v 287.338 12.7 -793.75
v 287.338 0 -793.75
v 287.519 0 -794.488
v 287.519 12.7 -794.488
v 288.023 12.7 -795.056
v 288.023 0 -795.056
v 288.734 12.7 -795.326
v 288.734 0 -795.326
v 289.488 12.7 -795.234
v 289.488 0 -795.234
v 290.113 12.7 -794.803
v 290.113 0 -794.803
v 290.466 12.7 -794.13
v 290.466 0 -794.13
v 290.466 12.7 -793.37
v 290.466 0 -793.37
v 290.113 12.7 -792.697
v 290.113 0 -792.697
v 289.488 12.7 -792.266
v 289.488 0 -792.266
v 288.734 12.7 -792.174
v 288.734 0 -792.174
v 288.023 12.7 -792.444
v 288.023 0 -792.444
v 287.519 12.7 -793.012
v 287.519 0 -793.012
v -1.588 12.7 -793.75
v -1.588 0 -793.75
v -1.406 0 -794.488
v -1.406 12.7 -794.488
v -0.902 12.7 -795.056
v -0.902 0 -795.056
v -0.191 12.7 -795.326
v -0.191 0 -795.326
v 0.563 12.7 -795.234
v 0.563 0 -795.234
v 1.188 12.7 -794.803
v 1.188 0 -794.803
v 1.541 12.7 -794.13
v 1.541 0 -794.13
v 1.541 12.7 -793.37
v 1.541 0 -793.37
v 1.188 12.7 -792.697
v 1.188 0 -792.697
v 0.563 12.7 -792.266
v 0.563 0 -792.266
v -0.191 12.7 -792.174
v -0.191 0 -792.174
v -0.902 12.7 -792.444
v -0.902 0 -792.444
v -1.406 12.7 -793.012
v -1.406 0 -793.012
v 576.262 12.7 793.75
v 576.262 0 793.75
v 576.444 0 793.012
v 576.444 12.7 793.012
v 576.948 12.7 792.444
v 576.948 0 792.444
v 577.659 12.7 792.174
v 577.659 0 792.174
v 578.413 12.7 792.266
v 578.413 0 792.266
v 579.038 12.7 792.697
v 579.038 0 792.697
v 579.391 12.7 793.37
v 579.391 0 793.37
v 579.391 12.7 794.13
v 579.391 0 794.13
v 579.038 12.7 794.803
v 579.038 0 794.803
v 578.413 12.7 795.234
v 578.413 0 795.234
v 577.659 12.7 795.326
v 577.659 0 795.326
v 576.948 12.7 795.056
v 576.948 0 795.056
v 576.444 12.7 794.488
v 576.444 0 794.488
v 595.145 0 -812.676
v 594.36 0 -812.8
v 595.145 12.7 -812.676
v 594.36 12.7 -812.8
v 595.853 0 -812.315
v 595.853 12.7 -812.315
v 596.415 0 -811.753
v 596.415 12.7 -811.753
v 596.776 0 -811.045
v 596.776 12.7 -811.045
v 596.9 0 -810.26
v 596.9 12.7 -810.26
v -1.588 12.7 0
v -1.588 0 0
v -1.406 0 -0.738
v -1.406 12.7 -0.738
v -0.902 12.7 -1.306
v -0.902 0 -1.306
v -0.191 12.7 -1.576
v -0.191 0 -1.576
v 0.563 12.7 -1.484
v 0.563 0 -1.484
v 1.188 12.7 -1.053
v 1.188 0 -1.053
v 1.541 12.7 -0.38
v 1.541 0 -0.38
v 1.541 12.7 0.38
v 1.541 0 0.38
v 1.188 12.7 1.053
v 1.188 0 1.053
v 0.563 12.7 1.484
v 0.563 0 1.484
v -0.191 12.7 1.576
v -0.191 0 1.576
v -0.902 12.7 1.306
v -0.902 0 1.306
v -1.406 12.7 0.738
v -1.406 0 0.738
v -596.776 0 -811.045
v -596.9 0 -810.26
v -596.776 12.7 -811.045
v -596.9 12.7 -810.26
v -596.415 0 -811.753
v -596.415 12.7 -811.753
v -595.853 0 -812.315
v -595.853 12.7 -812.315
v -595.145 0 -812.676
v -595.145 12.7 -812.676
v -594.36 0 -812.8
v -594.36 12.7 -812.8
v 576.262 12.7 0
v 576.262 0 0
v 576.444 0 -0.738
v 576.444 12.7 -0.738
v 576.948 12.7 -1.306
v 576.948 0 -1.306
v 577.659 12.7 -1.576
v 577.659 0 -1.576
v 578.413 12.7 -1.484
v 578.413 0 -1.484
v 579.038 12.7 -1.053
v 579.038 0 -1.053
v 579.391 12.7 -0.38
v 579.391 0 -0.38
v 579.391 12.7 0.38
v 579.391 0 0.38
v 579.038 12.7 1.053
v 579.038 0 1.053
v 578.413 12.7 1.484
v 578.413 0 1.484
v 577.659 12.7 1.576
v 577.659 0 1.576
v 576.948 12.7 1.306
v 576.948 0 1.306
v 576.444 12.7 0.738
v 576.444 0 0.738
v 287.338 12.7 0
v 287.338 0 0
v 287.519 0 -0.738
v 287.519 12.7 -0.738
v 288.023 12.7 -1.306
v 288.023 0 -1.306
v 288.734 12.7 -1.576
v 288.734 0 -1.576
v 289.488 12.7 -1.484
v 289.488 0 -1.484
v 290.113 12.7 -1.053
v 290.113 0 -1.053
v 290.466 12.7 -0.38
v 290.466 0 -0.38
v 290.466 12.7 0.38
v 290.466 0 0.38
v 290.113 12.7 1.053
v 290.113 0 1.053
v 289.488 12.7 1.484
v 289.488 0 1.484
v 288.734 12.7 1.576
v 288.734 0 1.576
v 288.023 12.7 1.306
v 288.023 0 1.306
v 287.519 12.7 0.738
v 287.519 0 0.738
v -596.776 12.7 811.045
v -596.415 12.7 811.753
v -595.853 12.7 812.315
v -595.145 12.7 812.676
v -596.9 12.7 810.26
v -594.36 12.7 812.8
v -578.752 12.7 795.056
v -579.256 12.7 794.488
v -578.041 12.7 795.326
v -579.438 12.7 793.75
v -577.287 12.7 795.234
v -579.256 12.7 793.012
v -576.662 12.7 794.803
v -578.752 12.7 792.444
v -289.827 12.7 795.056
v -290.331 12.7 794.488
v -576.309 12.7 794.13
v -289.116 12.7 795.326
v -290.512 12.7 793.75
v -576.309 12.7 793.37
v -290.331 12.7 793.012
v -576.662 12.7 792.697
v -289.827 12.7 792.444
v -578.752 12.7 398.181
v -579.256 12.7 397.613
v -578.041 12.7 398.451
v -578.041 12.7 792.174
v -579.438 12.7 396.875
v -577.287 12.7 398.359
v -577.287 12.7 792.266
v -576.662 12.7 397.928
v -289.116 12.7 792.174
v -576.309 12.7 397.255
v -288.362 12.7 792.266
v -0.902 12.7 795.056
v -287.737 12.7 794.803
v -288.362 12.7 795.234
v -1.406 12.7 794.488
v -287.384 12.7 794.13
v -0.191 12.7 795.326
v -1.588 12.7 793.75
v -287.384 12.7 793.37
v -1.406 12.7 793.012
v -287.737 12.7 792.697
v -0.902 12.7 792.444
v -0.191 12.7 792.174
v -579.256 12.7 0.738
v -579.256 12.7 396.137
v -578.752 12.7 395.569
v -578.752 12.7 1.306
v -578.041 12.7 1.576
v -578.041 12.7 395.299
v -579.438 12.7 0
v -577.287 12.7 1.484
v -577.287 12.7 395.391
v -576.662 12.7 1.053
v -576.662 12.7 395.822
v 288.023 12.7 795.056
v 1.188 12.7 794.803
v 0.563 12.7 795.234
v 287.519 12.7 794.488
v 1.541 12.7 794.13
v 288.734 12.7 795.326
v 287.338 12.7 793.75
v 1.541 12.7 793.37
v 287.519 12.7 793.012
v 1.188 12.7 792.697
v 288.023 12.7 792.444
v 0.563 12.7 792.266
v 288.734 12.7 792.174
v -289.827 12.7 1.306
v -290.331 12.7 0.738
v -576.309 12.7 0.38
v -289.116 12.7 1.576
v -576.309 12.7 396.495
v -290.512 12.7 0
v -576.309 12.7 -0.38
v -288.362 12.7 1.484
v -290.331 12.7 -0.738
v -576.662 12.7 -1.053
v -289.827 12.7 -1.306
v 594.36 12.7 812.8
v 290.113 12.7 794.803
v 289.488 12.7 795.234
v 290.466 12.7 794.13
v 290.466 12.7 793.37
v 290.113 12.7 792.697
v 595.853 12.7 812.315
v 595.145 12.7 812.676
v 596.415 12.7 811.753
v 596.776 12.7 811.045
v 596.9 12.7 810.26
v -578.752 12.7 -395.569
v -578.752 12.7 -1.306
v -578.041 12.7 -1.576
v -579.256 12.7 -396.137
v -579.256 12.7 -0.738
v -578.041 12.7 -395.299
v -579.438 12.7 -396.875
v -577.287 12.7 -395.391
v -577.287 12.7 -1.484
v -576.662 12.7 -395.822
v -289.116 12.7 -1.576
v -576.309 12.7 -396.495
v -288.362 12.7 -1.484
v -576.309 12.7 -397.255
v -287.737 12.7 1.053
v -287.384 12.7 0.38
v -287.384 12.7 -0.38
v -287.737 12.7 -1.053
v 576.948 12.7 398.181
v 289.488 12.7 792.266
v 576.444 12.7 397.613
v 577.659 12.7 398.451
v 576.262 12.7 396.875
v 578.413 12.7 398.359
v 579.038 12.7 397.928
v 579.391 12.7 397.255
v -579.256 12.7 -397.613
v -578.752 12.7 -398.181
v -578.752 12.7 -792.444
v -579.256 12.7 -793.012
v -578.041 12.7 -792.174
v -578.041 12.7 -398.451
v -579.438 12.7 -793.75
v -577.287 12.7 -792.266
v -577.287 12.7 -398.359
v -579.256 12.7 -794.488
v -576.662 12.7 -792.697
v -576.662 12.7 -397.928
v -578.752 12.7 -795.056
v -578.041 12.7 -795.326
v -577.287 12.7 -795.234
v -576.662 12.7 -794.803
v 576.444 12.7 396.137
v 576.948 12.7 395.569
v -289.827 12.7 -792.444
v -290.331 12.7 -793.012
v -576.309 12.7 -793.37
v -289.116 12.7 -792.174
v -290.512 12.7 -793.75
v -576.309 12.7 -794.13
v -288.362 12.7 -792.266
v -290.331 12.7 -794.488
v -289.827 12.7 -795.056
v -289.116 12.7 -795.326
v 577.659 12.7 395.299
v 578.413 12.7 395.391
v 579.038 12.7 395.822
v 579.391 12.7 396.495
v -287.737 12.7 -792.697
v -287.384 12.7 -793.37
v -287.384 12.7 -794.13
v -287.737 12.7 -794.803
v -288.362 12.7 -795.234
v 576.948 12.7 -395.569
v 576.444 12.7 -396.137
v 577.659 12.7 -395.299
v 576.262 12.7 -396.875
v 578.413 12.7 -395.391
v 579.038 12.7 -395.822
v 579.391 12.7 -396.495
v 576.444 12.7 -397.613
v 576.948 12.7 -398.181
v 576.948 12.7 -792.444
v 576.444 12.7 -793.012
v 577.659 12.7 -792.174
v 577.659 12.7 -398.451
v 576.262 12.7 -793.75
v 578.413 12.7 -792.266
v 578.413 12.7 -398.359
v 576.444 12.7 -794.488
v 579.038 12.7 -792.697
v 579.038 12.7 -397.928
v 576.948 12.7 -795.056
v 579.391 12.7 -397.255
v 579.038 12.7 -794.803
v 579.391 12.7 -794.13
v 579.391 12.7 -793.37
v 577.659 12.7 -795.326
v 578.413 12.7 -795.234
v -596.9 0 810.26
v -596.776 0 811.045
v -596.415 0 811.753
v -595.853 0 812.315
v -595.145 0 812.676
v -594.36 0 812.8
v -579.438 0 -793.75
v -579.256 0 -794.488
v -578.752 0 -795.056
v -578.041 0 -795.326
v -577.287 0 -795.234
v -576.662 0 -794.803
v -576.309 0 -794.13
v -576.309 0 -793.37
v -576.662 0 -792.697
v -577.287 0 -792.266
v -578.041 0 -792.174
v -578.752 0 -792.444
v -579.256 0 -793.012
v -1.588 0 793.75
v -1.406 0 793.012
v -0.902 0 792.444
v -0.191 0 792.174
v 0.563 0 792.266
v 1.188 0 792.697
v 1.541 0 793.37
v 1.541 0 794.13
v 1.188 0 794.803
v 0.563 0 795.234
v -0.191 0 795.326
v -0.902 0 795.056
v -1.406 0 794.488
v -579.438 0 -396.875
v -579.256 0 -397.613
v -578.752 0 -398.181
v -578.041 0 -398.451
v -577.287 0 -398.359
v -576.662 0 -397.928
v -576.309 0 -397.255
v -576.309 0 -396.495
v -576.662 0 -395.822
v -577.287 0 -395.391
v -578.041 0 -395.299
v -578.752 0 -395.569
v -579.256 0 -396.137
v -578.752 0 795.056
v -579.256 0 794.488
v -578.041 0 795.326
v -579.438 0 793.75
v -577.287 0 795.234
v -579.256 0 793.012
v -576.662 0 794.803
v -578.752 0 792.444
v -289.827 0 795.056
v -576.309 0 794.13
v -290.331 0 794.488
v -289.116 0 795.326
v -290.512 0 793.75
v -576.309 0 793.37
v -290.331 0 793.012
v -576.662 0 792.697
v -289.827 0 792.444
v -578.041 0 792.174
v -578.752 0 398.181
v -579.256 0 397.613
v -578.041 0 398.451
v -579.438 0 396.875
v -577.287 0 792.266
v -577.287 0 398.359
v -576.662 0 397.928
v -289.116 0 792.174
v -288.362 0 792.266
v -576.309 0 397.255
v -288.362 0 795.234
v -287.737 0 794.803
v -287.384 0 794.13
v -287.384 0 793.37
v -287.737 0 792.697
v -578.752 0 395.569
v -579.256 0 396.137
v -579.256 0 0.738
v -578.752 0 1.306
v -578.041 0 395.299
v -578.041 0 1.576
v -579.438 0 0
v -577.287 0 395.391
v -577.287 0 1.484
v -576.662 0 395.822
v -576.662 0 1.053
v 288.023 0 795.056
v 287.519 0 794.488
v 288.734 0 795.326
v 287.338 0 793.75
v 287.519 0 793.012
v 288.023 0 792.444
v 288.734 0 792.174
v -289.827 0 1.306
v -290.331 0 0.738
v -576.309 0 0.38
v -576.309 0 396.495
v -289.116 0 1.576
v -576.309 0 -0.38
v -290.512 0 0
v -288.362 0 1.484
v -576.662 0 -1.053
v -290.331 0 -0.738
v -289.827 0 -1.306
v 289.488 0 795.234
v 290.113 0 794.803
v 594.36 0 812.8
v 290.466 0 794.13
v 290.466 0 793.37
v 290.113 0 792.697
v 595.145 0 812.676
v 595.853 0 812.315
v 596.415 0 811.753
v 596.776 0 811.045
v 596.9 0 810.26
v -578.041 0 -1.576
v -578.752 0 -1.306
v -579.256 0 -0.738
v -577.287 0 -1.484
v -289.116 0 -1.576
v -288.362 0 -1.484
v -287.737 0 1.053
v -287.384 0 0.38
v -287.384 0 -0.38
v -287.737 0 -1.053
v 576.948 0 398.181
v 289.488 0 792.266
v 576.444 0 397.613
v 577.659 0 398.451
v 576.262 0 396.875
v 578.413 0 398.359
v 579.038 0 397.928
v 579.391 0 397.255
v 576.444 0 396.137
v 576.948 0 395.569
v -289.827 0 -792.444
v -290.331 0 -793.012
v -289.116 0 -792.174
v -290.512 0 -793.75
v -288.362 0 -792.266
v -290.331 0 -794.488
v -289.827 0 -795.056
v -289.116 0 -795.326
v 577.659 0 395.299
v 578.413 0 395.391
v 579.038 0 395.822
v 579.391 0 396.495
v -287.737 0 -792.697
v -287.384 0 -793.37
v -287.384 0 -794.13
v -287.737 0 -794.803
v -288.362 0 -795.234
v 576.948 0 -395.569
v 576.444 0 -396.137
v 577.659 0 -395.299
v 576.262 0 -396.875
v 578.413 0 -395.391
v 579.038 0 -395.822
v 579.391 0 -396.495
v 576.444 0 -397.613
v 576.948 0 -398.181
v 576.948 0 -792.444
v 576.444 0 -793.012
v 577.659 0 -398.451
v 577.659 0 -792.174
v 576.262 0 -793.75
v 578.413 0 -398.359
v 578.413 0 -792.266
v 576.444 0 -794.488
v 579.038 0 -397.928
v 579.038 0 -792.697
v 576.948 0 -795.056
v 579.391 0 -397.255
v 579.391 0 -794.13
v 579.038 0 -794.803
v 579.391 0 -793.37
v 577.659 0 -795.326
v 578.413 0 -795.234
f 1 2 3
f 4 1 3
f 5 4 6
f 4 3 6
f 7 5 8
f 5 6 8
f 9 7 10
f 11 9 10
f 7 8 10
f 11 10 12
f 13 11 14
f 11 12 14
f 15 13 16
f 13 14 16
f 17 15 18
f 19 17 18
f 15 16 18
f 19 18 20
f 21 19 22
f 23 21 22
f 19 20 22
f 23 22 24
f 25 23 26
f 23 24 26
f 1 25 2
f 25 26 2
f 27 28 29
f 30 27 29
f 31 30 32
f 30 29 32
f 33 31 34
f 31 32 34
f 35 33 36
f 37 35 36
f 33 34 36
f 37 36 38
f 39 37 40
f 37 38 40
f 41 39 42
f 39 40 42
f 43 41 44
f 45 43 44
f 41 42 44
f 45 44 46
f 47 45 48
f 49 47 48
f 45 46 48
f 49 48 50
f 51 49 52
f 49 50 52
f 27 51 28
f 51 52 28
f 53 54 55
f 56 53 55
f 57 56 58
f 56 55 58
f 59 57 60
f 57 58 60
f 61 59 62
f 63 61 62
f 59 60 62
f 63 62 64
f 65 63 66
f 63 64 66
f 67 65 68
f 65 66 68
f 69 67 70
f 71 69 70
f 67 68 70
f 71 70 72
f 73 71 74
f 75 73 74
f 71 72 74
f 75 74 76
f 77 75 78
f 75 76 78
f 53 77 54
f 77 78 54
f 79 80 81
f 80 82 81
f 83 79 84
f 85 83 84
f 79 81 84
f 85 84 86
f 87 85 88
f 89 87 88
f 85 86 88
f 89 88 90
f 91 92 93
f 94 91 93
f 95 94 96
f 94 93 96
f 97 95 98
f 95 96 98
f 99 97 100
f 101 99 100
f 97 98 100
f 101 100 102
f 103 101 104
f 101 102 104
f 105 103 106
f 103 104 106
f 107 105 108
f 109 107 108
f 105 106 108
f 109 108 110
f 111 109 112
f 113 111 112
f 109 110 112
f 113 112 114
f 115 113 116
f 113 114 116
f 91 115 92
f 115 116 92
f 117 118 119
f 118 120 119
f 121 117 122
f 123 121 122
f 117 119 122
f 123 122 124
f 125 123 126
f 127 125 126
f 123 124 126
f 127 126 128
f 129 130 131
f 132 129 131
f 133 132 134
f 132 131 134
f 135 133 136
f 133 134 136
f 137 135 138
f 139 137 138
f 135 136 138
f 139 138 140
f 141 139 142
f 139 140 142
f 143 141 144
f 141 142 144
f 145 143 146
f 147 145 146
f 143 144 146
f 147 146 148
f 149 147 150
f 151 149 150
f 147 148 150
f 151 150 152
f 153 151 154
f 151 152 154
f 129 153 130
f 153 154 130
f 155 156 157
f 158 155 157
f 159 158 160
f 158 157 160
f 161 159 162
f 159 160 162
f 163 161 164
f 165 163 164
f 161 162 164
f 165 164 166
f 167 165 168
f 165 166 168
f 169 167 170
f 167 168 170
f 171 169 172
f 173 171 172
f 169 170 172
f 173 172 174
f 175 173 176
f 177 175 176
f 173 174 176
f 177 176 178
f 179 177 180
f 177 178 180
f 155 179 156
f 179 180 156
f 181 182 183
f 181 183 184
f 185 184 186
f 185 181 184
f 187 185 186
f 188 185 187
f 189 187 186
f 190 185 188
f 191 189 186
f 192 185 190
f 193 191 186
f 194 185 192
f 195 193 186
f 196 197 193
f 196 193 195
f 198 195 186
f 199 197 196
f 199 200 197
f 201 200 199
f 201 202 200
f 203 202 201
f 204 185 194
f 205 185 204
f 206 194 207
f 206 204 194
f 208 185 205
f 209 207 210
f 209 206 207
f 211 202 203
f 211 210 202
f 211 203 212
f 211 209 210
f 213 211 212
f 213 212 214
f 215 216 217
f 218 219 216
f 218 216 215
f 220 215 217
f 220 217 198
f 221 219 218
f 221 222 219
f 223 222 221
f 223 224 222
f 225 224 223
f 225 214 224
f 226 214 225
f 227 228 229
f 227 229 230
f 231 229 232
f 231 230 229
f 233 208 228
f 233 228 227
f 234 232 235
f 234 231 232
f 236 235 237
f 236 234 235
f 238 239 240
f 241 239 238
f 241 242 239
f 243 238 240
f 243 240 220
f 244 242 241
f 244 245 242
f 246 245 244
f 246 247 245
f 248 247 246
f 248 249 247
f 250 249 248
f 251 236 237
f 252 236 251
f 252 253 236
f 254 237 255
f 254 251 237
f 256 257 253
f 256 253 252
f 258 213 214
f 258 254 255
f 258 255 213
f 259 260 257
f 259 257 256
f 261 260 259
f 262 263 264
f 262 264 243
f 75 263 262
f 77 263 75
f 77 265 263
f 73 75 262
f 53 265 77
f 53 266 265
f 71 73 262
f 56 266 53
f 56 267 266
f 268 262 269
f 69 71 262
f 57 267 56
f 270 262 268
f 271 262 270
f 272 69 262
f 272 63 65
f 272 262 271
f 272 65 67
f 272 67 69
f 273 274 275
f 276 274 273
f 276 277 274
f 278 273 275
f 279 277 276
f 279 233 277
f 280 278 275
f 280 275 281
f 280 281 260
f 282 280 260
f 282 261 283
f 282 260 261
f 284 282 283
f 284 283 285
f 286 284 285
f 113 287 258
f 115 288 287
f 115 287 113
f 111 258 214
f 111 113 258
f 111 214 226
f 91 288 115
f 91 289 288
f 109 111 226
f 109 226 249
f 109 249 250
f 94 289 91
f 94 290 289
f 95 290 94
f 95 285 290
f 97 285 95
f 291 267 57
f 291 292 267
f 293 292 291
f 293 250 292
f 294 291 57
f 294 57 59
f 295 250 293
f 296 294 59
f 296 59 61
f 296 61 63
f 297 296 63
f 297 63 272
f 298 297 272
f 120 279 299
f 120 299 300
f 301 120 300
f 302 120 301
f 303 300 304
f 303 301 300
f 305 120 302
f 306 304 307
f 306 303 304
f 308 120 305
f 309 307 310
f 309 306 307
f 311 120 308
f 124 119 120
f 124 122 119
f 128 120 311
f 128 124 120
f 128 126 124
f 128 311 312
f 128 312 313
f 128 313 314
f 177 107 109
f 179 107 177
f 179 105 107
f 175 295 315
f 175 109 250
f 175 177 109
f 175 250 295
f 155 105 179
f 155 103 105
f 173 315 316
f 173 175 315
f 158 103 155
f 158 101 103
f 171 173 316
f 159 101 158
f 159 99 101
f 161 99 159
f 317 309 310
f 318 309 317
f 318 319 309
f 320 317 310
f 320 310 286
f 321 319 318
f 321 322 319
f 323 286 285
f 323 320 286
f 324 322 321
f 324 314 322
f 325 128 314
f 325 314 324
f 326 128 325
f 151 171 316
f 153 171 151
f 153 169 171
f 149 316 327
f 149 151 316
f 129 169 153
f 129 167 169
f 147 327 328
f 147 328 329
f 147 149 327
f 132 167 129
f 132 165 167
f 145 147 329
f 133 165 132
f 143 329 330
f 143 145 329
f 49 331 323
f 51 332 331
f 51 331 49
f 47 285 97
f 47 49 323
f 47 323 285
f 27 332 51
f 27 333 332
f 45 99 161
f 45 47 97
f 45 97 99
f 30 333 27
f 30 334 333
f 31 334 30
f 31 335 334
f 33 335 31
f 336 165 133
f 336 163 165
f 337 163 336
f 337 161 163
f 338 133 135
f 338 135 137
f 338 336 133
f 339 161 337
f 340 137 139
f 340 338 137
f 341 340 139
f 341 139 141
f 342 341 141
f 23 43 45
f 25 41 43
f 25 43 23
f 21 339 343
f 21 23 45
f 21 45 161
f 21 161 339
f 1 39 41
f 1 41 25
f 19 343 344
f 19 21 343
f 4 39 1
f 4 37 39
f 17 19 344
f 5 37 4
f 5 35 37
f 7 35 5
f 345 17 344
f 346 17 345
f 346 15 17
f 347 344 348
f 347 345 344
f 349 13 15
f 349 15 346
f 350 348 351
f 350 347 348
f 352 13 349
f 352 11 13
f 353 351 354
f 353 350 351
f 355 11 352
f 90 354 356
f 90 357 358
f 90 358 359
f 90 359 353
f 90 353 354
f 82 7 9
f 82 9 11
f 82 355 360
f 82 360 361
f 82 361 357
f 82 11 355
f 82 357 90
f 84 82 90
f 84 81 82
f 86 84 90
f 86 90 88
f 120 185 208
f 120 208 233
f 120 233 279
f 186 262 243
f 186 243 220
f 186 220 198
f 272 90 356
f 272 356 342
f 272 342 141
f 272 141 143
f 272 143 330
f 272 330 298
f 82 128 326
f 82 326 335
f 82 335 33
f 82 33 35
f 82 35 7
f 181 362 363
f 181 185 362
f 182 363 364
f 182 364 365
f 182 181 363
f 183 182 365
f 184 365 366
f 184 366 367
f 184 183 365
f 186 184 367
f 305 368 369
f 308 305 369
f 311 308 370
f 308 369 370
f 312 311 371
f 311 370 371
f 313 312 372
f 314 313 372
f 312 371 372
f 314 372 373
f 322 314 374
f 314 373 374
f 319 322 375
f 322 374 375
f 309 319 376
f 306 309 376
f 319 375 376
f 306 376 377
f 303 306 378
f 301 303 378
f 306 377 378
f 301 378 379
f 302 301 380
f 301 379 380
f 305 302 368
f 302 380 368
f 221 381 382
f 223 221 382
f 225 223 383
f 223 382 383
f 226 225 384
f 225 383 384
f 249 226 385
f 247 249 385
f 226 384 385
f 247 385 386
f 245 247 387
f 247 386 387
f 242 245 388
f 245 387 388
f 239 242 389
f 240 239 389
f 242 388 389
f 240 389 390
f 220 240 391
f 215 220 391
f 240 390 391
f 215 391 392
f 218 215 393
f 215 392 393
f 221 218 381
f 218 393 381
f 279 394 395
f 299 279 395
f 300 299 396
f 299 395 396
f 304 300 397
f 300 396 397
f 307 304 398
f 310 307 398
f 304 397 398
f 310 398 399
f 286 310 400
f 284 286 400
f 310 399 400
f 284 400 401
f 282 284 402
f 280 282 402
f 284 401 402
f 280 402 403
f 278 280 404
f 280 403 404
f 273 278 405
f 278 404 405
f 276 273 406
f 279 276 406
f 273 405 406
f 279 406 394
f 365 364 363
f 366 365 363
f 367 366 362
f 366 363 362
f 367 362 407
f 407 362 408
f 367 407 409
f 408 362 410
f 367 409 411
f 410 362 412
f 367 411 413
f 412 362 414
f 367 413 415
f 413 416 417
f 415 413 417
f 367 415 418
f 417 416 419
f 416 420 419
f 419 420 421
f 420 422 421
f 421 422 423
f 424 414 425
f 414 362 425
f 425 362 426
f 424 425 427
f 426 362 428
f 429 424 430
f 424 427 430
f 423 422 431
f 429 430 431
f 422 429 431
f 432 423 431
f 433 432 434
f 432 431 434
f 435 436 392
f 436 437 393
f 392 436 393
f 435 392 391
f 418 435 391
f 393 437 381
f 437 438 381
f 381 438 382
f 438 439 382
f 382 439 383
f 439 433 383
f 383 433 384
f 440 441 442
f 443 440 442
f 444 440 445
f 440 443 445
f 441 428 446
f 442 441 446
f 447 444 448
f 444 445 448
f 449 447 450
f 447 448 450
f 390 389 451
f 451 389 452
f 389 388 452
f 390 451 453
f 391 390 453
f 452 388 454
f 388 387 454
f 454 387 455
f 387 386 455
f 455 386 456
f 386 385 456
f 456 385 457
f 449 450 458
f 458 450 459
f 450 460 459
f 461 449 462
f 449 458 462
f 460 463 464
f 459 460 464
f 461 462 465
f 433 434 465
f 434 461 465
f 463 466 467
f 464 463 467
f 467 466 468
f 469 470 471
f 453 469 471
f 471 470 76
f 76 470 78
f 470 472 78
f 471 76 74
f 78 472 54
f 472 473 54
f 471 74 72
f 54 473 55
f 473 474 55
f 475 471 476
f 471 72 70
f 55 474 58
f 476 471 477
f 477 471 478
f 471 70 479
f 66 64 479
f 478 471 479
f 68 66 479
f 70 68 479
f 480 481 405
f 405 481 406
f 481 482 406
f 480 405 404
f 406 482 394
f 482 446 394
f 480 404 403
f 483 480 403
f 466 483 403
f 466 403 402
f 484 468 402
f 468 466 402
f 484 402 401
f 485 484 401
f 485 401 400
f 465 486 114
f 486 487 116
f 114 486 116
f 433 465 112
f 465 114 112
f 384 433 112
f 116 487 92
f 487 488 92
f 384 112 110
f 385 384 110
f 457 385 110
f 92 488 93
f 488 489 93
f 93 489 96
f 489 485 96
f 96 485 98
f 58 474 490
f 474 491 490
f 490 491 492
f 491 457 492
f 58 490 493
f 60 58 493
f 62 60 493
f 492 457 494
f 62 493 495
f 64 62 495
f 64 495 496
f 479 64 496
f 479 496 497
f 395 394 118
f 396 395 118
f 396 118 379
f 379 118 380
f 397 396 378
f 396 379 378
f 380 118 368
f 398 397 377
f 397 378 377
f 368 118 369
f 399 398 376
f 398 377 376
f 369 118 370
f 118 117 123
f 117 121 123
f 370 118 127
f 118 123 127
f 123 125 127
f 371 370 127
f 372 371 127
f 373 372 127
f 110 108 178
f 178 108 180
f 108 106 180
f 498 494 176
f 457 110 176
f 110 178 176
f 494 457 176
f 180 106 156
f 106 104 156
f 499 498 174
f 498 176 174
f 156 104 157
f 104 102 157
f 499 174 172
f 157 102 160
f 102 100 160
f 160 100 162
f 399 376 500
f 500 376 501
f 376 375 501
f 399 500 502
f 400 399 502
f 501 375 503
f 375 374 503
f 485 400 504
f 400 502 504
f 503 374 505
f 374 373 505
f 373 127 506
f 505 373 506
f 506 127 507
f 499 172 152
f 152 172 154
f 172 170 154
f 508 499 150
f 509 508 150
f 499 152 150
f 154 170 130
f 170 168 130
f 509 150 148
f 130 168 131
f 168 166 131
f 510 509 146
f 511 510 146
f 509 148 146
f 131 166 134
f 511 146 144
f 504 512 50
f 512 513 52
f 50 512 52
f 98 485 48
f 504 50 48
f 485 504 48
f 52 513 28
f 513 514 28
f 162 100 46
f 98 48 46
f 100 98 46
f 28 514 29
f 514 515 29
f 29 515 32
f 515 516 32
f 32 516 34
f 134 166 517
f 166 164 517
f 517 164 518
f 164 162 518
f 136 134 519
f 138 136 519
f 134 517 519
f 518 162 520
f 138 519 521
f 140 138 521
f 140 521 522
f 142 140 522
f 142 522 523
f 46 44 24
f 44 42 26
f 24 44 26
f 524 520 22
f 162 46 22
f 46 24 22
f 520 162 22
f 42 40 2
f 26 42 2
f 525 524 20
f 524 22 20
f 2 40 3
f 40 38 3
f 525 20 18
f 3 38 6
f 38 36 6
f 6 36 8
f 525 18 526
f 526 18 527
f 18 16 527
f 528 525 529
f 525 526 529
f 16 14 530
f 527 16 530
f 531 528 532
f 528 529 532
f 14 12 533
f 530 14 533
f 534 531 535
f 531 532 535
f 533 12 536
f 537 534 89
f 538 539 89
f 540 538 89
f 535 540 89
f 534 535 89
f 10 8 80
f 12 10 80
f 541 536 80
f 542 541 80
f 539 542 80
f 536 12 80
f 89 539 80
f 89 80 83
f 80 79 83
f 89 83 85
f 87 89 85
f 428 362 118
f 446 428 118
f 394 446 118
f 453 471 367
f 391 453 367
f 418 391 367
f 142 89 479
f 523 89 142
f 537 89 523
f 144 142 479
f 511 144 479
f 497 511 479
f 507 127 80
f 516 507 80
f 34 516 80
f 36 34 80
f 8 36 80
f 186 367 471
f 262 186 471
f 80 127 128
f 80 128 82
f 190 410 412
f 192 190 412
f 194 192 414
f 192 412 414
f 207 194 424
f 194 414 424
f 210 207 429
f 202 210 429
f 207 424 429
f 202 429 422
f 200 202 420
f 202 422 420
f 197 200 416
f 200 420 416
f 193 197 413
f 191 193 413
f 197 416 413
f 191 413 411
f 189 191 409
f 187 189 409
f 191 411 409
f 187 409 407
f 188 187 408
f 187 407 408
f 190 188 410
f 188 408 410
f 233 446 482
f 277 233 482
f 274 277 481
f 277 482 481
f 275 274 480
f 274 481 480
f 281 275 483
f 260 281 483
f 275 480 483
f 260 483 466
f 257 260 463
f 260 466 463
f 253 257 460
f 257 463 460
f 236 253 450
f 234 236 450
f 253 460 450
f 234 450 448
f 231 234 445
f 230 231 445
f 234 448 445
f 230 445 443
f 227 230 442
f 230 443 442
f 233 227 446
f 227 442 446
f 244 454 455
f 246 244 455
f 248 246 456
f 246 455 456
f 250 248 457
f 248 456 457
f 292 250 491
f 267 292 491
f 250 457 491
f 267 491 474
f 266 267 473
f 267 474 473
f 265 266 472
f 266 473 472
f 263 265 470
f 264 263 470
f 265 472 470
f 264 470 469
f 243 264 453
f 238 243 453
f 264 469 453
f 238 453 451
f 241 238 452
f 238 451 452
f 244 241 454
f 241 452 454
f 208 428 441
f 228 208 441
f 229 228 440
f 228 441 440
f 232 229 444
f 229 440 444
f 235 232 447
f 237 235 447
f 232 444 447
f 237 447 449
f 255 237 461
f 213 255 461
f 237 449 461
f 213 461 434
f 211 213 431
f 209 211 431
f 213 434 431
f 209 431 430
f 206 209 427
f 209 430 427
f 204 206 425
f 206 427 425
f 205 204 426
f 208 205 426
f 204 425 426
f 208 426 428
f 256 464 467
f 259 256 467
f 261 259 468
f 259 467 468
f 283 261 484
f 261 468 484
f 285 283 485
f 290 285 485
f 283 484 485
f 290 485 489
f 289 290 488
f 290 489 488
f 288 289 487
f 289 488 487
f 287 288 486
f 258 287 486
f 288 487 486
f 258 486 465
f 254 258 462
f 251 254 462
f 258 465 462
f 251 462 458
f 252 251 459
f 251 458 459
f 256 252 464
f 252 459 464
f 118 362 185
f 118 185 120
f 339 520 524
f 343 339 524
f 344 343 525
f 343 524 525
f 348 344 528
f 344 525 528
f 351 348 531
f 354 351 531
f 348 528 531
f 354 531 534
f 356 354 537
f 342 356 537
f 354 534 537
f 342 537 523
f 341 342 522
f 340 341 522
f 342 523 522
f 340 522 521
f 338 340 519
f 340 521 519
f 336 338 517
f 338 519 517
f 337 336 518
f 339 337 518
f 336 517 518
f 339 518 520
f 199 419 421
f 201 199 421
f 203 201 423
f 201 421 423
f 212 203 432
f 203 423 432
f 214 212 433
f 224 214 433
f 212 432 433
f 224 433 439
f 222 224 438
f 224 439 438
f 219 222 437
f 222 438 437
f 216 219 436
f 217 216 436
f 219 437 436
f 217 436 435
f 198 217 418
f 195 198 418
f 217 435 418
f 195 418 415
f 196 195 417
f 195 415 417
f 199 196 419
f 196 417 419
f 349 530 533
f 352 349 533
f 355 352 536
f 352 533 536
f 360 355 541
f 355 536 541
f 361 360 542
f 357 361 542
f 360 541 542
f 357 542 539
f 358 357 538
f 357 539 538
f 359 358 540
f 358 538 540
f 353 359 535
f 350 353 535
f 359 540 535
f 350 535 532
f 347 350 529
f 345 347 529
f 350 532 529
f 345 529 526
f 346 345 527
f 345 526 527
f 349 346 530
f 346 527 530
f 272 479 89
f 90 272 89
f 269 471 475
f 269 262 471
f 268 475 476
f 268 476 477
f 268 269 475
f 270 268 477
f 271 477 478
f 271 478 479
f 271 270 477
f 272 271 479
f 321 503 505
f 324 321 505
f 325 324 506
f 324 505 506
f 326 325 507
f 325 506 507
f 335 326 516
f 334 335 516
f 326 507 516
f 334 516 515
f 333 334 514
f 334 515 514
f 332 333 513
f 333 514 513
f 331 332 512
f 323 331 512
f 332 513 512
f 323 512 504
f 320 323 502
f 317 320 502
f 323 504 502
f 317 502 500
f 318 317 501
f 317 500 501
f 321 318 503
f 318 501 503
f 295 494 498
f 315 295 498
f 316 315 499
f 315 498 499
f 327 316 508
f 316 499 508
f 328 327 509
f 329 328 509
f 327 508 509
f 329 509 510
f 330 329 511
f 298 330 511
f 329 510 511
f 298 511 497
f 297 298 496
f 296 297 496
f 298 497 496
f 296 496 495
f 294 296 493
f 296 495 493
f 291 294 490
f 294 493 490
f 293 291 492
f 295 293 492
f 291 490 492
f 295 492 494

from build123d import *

# Parameters (mm, degrees)
SKETCH1_W                        = 1193.8
SKETCH1_H                        = 1625.6
BOSS_EXTRUDE1_DEPTH              = 12.7
F_1_8_0_125_DIAMETER_HOLE1_D     = 3.175
F_1_8_0_125_DIAMETER_HOLE2_D     = 3.175
F_1_8_0_125_DIAMETER_HOLE2_DEPTH = 12.7
FILLET1_R                        = 2.54


with BuildPart() as part:
    # Sketch1 → Boss-Extrude1 (new body)
    with BuildSketch(Plane(origin=(0, 0, 0), x_dir=(1, 0, 0), z_dir=(0, 1, 0))):
        Rectangle(SKETCH1_W, SKETCH1_H)
    extrude(amount=BOSS_EXTRUDE1_DEPTH)

    # 1/8 (0.125) Diameter Hole1 (through all)
    with Locations(Plane(origin=(0, 12.7, 0), x_dir=(1, 0, 0), z_dir=(0, 1, 0))):
        with Locations((577.85, 0), (-577.85, -793.75), (-577.85, 793.75), (-288.925, 793.75), (0, 793.75), (288.925, 793.75), (577.85, 793.75), (-288.925, -793.75), (0, -793.75), (288.925, -793.75), (577.85, -793.75), (-577.85, 0), (-288.925, 0), (0, 0), (288.925, 0)):
            Hole(F_1_8_0_125_DIAMETER_HOLE1_D / 2)

    # 1/8 (0.125) Diameter Hole2
    with Locations(Plane(origin=(0, 12.7, 0), x_dir=(1, 0, 0), z_dir=(0, 1, 0))):
        with Locations((577.85, 396.875), (-577.85, -396.875), (-577.85, -793.75), (577.85, -793.75), (577.85, -396.875), (-577.85, 0), (577.85, 0), (-577.85, 396.875)):
            Hole(F_1_8_0_125_DIAMETER_HOLE2_D / 2, depth=F_1_8_0_125_DIAMETER_HOLE2_DEPTH)

    # Fillet1
    fillet1_edges = [part.edges().sort_by_distance(p)[0] for p in [
        (596.9, 6.35, 812.8),
        (-596.9, 6.35, 812.8),
        (-596.9, 6.35, -812.8),
        (596.9, 6.35, -812.8),
    ]]
    fillet(fillet1_edges, radius=FILLET1_R)


solid = part.part
